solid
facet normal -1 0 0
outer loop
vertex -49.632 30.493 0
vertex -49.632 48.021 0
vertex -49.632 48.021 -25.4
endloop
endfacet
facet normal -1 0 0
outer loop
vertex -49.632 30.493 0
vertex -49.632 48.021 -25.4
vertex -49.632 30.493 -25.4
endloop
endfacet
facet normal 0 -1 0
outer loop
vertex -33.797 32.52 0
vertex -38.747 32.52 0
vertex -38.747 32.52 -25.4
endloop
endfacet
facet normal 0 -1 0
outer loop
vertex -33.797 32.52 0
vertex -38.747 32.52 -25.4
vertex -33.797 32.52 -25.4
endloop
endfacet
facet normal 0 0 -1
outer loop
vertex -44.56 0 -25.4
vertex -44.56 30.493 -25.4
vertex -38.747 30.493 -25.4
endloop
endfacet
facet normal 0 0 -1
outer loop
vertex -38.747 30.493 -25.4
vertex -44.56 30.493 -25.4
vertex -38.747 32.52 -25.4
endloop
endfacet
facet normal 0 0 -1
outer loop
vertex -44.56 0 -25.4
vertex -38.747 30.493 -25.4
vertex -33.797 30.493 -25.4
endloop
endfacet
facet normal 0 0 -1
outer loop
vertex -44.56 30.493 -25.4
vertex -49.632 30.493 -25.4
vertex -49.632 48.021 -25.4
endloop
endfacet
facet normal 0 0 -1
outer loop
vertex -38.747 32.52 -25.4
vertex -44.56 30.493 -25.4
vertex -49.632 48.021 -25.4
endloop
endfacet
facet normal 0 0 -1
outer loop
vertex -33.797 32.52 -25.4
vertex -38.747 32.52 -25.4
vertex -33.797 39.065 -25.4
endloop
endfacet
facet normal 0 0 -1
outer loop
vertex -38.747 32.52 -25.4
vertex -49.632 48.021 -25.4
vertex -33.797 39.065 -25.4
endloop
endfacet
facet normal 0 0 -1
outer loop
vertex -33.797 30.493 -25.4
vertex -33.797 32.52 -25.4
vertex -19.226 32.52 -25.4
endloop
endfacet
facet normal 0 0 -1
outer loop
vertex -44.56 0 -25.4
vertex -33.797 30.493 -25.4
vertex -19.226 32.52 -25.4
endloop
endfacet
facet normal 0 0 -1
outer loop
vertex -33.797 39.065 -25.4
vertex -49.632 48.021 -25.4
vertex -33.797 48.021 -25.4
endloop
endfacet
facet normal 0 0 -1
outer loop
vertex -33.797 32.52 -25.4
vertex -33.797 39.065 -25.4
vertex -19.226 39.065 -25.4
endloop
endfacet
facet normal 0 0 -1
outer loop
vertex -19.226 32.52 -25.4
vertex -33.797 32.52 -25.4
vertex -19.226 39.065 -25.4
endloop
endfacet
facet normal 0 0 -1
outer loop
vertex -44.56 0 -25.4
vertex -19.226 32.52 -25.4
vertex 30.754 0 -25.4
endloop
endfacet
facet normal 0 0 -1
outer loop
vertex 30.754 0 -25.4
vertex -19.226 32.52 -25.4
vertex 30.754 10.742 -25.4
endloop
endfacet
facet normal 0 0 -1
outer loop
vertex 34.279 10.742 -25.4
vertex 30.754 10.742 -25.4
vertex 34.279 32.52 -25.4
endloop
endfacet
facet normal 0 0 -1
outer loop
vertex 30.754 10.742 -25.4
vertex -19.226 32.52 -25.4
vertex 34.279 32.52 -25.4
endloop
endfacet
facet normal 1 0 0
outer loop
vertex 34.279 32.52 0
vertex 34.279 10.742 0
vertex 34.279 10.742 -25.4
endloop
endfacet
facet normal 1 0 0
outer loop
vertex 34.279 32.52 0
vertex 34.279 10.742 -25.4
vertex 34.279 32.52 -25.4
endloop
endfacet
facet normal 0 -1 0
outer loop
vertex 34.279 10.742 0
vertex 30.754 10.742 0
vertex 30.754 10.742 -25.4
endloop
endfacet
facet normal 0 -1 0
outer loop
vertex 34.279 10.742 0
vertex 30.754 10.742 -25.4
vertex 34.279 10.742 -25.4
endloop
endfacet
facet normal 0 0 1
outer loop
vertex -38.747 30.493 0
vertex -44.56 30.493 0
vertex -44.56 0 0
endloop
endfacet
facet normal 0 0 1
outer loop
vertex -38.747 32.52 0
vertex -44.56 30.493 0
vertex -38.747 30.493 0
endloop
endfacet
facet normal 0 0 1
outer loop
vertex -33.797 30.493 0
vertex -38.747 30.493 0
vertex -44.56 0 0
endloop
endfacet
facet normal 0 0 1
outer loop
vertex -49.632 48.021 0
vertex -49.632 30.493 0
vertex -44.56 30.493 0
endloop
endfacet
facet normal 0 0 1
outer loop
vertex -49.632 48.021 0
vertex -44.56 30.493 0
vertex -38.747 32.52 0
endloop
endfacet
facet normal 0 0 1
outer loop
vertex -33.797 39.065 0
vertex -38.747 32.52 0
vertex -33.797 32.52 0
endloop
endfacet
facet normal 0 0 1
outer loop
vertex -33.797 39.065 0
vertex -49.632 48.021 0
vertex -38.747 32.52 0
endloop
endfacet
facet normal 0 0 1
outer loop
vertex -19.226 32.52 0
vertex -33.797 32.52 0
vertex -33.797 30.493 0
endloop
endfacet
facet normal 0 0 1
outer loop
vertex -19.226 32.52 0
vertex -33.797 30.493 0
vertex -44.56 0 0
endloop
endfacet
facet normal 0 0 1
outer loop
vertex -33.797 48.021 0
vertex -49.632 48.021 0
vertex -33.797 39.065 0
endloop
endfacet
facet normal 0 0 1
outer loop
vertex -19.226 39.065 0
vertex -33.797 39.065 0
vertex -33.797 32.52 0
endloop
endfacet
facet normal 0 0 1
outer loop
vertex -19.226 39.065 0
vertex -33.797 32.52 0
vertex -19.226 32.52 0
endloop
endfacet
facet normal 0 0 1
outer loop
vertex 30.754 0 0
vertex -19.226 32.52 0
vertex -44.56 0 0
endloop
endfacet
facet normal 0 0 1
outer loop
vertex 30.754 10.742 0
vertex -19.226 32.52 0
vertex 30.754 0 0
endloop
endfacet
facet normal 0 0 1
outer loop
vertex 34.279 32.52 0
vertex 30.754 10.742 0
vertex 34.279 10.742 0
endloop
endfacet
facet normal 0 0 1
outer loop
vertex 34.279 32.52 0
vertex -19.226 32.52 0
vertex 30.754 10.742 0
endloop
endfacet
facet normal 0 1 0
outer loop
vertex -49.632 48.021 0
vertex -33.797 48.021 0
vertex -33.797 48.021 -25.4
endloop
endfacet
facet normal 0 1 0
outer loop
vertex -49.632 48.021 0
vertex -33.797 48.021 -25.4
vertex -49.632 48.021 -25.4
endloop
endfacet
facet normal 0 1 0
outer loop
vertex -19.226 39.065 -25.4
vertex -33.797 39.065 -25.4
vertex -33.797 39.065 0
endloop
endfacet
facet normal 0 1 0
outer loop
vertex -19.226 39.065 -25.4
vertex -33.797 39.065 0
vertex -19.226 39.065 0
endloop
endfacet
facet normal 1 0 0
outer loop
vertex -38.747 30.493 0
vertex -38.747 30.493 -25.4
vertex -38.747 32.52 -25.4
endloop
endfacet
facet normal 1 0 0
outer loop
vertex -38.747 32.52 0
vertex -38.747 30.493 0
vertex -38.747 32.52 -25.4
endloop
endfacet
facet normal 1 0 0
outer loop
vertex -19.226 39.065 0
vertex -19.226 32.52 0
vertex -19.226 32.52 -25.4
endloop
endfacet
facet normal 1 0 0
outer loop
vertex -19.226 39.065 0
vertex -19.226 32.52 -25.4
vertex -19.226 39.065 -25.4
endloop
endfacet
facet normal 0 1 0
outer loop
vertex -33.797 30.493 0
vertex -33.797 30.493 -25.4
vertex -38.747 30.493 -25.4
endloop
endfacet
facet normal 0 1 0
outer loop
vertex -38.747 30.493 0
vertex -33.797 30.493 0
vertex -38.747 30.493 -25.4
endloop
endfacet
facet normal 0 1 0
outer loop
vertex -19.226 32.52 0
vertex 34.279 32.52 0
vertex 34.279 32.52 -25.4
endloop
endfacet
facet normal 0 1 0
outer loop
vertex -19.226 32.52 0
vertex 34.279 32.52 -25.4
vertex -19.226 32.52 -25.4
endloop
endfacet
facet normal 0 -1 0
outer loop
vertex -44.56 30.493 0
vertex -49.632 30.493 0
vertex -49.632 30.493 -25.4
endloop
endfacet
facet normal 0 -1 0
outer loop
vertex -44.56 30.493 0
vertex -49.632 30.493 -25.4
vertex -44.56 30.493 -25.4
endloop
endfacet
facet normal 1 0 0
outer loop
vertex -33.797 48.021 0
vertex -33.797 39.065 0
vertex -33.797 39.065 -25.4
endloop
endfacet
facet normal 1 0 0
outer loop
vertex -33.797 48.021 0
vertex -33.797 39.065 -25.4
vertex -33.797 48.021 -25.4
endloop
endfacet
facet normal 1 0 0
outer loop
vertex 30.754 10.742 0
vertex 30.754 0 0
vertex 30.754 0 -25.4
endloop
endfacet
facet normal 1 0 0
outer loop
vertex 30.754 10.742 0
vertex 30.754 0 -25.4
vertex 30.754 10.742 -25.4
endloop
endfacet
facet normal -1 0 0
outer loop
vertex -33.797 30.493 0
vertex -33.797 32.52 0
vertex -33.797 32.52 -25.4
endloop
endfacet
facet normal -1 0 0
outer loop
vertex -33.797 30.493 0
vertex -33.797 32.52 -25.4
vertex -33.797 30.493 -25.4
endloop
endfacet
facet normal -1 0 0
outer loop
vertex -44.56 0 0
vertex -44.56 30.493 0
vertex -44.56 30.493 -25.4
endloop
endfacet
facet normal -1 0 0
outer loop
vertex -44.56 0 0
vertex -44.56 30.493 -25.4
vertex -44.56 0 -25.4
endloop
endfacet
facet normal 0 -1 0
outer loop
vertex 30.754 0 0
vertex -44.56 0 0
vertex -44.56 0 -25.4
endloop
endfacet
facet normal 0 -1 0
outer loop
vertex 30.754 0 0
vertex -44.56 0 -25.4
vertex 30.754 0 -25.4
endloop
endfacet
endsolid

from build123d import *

# Parameters (mm, degrees)
F0_W     = 14.5715866238
F0_H     = 6.5456330776
F0_W_2   = 4.949297756
F0_W_3   = 5.8135613799
F0_H_2   = 2.0267963409
F0_W_4   = 3.5245139152
F0_H_3   = 21.7774156481
F1_DEPTH = 25.4


with BuildPart() as f1:
    # F0 (on Top) → F1 (new body)
    with BuildSketch(Plane.XY):
        Polygon((-33.7974205613, 48.0205528438), (-49.6319867671, 48.0205528438), (-49.6319867671, 30.4928608239), (-44.5602796972, 30.4928608239), (-44.5602796972, 32.5196571648), (-38.7467183173, 32.5196571648), (-38.7467183173, 39.0652902424), (-33.7974205613, 39.0652902424), align=None)
        with Locations((-26.5116272494, 35.7924737036)):
            Rectangle(F0_W, F0_H)
        with Locations((-36.2720694393, 35.7924737036)):
            Rectangle(F0_W_2, F0_H)
        with Locations((-41.6534990072, 31.5062589943)):
            Rectangle(F0_W_3, F0_H_2)
        Polygon((-38.7467183173, 30.4928608239), (-44.5602796972, 30.4928608239), (-44.5602796972, 0), (30.7543519884, 0), (30.7543519884, 10.7422415167), (30.7543519884, 32.5196571648), (-19.2258339375, 32.5196571648), (-19.2258339375, 9.3785366043), (-38.7467183173, 9.3785366043), align=None)
        Polygon((-19.2258339375, 32.5196571648), (-33.7974205613, 32.5196571648), (-33.7974205613, 30.4928608239), (-38.7467183173, 30.4928608239), (-38.7467183173, 9.3785366043), (-19.2258339375, 9.3785366043), align=None)
        with Locations((32.516608946, 21.6309493408)):
            Rectangle(F0_W_4, F0_H_3)
    extrude(amount=-F1_DEPTH)


solid = f1.part
